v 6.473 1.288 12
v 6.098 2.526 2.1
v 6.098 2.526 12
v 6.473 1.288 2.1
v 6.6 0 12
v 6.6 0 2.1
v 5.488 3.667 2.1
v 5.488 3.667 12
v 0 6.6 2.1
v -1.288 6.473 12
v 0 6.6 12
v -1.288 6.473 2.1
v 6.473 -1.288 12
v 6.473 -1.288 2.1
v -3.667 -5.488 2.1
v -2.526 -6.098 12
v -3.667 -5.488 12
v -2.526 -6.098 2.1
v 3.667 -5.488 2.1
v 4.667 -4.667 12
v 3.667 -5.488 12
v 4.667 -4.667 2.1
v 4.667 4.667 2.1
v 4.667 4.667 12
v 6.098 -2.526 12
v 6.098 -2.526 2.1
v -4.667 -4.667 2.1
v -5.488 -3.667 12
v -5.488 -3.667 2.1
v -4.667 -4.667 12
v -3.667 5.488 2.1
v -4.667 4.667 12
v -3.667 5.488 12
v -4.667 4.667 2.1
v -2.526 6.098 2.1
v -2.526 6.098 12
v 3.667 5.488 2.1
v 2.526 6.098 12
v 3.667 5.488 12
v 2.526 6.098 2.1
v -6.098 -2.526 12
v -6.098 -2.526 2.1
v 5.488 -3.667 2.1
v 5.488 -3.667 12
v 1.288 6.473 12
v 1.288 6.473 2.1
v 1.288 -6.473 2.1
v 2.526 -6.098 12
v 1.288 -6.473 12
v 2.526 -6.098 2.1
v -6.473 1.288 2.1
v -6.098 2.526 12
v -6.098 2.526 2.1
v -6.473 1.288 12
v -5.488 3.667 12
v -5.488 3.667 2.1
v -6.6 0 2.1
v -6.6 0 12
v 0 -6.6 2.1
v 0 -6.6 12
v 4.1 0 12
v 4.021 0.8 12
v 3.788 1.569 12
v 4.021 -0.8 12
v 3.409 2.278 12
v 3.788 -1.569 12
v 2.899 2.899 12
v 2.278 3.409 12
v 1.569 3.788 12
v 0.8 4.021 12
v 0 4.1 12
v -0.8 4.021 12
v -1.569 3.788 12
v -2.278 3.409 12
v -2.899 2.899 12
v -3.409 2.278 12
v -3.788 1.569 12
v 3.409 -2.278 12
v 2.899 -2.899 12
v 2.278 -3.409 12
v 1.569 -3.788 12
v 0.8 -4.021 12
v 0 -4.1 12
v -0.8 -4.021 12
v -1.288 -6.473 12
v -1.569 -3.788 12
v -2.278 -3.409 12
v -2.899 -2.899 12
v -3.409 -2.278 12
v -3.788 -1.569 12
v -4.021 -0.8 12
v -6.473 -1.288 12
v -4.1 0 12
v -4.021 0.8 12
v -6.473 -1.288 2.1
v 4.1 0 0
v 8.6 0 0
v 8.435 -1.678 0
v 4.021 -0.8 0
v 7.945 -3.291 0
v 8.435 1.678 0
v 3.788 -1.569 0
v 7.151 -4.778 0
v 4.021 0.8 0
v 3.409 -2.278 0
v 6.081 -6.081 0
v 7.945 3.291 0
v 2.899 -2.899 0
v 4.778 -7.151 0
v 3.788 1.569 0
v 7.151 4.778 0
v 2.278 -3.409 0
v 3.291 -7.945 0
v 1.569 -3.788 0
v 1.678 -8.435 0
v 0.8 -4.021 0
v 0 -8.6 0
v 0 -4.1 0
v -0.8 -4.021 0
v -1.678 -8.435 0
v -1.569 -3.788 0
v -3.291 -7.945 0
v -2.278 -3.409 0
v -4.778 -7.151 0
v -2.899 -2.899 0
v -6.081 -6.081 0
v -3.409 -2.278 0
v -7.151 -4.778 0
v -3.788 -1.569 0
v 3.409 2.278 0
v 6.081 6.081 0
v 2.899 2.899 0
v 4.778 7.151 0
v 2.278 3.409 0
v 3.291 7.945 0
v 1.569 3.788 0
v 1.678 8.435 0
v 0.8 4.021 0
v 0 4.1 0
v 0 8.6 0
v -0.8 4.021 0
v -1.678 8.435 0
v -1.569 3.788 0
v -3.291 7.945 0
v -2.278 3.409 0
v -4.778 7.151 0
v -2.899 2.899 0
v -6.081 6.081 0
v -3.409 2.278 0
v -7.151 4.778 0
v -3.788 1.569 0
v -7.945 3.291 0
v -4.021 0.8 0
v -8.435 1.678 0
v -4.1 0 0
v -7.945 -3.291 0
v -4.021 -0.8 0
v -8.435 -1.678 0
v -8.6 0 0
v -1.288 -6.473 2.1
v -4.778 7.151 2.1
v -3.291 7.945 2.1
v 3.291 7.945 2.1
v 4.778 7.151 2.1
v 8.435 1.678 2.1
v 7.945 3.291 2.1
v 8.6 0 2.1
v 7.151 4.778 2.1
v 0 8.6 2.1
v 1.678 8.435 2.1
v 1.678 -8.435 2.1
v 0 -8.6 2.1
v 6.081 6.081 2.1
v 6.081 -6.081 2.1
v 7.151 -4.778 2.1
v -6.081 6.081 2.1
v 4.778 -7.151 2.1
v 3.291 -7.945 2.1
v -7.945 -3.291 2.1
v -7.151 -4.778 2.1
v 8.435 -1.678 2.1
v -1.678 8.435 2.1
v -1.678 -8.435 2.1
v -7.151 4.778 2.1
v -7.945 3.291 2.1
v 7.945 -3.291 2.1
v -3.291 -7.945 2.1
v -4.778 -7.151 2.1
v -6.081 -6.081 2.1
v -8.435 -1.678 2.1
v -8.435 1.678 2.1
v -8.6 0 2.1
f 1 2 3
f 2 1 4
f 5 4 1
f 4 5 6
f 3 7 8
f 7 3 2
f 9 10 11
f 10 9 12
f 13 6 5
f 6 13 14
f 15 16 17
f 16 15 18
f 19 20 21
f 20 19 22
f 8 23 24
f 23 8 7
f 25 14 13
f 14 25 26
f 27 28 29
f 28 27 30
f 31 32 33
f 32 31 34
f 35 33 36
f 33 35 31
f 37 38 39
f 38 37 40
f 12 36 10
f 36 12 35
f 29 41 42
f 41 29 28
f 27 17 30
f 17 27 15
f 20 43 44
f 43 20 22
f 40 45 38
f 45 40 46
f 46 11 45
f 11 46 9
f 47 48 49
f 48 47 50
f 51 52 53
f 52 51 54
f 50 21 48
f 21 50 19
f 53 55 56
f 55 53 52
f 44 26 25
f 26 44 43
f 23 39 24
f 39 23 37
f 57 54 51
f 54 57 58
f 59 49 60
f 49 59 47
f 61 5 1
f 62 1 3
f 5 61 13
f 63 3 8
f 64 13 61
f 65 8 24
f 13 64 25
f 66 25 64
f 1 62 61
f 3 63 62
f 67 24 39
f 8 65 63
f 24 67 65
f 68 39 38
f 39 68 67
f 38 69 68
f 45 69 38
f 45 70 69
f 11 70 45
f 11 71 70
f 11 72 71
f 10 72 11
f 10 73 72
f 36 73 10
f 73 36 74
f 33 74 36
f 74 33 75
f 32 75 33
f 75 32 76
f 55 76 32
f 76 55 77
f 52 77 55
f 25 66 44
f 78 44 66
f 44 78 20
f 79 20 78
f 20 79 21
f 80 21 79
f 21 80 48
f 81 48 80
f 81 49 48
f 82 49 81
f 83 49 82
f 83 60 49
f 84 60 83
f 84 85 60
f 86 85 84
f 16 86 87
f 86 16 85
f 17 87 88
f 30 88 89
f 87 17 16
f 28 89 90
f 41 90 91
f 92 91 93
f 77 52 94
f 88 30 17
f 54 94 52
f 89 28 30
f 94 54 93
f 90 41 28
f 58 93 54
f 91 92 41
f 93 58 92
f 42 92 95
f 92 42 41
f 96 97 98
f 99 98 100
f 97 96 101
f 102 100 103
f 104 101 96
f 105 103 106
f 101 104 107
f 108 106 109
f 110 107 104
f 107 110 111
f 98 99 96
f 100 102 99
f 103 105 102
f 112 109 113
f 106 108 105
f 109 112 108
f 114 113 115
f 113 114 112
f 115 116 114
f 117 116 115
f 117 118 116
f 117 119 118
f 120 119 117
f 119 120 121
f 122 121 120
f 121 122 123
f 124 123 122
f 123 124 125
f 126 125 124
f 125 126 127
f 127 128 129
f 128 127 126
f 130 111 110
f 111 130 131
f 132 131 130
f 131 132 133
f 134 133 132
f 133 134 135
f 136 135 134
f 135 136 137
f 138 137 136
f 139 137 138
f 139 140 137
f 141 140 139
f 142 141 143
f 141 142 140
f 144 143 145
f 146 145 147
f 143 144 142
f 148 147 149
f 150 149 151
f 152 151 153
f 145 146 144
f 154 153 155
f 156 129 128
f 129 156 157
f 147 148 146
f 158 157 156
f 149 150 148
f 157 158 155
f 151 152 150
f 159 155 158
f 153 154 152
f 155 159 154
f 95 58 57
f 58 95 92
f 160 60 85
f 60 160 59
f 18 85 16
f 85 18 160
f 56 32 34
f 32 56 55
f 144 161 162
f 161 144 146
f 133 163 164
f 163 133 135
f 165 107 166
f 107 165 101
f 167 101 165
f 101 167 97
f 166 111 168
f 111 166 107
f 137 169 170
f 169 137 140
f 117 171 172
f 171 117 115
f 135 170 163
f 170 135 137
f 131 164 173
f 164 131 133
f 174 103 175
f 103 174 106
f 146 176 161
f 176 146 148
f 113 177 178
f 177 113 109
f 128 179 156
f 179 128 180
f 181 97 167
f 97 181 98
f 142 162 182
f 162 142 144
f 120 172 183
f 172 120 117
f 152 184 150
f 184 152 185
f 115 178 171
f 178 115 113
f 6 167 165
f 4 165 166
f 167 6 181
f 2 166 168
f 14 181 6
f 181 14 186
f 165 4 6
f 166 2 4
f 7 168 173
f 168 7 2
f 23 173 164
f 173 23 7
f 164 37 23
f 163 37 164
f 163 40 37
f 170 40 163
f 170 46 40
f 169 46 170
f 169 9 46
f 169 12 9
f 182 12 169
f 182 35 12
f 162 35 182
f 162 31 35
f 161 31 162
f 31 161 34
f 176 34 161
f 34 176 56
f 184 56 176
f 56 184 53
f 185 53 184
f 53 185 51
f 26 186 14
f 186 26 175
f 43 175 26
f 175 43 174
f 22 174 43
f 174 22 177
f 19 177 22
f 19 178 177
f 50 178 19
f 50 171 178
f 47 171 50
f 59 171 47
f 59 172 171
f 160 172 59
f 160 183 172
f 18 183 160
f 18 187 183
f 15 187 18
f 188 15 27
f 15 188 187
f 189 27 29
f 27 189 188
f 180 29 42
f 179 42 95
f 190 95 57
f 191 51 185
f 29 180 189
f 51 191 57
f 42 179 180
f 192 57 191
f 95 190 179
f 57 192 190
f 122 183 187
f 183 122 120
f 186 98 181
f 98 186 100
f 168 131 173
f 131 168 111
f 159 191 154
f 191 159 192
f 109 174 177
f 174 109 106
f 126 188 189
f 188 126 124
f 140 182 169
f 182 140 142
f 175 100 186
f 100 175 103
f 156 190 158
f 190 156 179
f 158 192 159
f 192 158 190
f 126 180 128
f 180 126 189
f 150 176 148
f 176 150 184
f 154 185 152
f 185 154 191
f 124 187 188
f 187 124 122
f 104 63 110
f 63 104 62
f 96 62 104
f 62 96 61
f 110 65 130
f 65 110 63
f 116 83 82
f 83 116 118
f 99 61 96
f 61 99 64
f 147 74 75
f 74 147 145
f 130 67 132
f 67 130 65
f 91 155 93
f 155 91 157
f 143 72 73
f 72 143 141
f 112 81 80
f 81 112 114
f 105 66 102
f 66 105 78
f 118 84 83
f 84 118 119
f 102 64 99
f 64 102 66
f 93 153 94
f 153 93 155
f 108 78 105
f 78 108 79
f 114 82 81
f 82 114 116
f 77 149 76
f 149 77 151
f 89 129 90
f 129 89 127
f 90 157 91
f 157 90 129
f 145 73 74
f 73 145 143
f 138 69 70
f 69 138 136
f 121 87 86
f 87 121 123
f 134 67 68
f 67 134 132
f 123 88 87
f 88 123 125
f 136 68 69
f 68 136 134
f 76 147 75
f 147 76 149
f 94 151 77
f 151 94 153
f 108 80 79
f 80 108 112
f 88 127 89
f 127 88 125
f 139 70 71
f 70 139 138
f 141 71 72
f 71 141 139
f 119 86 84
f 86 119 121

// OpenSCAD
$fn = 32;

// ----------------------------------------------------------------------
// Spacer sleeve: 13.2 / 8.2 x 12 mm
// ----------------------------------------------------------------------

// --- parameters (mm) ---
outer_d = 13.2;           // outside diameter
inner_d = 8.2;            // shaft bore
length = 12;              // sleeve length
flange_d = 17.2;          // collar diameter
flange_t = 1.5;           // collar thickness

module sleeve() {
  cylinder(h = length, d = outer_d);
  cylinder(h = flange_t + 0.6, d = flange_d);
}

difference() {
  sleeve();
  translate([0, 0, -1]) cylinder(h = length + 2, d = inner_d);
}
